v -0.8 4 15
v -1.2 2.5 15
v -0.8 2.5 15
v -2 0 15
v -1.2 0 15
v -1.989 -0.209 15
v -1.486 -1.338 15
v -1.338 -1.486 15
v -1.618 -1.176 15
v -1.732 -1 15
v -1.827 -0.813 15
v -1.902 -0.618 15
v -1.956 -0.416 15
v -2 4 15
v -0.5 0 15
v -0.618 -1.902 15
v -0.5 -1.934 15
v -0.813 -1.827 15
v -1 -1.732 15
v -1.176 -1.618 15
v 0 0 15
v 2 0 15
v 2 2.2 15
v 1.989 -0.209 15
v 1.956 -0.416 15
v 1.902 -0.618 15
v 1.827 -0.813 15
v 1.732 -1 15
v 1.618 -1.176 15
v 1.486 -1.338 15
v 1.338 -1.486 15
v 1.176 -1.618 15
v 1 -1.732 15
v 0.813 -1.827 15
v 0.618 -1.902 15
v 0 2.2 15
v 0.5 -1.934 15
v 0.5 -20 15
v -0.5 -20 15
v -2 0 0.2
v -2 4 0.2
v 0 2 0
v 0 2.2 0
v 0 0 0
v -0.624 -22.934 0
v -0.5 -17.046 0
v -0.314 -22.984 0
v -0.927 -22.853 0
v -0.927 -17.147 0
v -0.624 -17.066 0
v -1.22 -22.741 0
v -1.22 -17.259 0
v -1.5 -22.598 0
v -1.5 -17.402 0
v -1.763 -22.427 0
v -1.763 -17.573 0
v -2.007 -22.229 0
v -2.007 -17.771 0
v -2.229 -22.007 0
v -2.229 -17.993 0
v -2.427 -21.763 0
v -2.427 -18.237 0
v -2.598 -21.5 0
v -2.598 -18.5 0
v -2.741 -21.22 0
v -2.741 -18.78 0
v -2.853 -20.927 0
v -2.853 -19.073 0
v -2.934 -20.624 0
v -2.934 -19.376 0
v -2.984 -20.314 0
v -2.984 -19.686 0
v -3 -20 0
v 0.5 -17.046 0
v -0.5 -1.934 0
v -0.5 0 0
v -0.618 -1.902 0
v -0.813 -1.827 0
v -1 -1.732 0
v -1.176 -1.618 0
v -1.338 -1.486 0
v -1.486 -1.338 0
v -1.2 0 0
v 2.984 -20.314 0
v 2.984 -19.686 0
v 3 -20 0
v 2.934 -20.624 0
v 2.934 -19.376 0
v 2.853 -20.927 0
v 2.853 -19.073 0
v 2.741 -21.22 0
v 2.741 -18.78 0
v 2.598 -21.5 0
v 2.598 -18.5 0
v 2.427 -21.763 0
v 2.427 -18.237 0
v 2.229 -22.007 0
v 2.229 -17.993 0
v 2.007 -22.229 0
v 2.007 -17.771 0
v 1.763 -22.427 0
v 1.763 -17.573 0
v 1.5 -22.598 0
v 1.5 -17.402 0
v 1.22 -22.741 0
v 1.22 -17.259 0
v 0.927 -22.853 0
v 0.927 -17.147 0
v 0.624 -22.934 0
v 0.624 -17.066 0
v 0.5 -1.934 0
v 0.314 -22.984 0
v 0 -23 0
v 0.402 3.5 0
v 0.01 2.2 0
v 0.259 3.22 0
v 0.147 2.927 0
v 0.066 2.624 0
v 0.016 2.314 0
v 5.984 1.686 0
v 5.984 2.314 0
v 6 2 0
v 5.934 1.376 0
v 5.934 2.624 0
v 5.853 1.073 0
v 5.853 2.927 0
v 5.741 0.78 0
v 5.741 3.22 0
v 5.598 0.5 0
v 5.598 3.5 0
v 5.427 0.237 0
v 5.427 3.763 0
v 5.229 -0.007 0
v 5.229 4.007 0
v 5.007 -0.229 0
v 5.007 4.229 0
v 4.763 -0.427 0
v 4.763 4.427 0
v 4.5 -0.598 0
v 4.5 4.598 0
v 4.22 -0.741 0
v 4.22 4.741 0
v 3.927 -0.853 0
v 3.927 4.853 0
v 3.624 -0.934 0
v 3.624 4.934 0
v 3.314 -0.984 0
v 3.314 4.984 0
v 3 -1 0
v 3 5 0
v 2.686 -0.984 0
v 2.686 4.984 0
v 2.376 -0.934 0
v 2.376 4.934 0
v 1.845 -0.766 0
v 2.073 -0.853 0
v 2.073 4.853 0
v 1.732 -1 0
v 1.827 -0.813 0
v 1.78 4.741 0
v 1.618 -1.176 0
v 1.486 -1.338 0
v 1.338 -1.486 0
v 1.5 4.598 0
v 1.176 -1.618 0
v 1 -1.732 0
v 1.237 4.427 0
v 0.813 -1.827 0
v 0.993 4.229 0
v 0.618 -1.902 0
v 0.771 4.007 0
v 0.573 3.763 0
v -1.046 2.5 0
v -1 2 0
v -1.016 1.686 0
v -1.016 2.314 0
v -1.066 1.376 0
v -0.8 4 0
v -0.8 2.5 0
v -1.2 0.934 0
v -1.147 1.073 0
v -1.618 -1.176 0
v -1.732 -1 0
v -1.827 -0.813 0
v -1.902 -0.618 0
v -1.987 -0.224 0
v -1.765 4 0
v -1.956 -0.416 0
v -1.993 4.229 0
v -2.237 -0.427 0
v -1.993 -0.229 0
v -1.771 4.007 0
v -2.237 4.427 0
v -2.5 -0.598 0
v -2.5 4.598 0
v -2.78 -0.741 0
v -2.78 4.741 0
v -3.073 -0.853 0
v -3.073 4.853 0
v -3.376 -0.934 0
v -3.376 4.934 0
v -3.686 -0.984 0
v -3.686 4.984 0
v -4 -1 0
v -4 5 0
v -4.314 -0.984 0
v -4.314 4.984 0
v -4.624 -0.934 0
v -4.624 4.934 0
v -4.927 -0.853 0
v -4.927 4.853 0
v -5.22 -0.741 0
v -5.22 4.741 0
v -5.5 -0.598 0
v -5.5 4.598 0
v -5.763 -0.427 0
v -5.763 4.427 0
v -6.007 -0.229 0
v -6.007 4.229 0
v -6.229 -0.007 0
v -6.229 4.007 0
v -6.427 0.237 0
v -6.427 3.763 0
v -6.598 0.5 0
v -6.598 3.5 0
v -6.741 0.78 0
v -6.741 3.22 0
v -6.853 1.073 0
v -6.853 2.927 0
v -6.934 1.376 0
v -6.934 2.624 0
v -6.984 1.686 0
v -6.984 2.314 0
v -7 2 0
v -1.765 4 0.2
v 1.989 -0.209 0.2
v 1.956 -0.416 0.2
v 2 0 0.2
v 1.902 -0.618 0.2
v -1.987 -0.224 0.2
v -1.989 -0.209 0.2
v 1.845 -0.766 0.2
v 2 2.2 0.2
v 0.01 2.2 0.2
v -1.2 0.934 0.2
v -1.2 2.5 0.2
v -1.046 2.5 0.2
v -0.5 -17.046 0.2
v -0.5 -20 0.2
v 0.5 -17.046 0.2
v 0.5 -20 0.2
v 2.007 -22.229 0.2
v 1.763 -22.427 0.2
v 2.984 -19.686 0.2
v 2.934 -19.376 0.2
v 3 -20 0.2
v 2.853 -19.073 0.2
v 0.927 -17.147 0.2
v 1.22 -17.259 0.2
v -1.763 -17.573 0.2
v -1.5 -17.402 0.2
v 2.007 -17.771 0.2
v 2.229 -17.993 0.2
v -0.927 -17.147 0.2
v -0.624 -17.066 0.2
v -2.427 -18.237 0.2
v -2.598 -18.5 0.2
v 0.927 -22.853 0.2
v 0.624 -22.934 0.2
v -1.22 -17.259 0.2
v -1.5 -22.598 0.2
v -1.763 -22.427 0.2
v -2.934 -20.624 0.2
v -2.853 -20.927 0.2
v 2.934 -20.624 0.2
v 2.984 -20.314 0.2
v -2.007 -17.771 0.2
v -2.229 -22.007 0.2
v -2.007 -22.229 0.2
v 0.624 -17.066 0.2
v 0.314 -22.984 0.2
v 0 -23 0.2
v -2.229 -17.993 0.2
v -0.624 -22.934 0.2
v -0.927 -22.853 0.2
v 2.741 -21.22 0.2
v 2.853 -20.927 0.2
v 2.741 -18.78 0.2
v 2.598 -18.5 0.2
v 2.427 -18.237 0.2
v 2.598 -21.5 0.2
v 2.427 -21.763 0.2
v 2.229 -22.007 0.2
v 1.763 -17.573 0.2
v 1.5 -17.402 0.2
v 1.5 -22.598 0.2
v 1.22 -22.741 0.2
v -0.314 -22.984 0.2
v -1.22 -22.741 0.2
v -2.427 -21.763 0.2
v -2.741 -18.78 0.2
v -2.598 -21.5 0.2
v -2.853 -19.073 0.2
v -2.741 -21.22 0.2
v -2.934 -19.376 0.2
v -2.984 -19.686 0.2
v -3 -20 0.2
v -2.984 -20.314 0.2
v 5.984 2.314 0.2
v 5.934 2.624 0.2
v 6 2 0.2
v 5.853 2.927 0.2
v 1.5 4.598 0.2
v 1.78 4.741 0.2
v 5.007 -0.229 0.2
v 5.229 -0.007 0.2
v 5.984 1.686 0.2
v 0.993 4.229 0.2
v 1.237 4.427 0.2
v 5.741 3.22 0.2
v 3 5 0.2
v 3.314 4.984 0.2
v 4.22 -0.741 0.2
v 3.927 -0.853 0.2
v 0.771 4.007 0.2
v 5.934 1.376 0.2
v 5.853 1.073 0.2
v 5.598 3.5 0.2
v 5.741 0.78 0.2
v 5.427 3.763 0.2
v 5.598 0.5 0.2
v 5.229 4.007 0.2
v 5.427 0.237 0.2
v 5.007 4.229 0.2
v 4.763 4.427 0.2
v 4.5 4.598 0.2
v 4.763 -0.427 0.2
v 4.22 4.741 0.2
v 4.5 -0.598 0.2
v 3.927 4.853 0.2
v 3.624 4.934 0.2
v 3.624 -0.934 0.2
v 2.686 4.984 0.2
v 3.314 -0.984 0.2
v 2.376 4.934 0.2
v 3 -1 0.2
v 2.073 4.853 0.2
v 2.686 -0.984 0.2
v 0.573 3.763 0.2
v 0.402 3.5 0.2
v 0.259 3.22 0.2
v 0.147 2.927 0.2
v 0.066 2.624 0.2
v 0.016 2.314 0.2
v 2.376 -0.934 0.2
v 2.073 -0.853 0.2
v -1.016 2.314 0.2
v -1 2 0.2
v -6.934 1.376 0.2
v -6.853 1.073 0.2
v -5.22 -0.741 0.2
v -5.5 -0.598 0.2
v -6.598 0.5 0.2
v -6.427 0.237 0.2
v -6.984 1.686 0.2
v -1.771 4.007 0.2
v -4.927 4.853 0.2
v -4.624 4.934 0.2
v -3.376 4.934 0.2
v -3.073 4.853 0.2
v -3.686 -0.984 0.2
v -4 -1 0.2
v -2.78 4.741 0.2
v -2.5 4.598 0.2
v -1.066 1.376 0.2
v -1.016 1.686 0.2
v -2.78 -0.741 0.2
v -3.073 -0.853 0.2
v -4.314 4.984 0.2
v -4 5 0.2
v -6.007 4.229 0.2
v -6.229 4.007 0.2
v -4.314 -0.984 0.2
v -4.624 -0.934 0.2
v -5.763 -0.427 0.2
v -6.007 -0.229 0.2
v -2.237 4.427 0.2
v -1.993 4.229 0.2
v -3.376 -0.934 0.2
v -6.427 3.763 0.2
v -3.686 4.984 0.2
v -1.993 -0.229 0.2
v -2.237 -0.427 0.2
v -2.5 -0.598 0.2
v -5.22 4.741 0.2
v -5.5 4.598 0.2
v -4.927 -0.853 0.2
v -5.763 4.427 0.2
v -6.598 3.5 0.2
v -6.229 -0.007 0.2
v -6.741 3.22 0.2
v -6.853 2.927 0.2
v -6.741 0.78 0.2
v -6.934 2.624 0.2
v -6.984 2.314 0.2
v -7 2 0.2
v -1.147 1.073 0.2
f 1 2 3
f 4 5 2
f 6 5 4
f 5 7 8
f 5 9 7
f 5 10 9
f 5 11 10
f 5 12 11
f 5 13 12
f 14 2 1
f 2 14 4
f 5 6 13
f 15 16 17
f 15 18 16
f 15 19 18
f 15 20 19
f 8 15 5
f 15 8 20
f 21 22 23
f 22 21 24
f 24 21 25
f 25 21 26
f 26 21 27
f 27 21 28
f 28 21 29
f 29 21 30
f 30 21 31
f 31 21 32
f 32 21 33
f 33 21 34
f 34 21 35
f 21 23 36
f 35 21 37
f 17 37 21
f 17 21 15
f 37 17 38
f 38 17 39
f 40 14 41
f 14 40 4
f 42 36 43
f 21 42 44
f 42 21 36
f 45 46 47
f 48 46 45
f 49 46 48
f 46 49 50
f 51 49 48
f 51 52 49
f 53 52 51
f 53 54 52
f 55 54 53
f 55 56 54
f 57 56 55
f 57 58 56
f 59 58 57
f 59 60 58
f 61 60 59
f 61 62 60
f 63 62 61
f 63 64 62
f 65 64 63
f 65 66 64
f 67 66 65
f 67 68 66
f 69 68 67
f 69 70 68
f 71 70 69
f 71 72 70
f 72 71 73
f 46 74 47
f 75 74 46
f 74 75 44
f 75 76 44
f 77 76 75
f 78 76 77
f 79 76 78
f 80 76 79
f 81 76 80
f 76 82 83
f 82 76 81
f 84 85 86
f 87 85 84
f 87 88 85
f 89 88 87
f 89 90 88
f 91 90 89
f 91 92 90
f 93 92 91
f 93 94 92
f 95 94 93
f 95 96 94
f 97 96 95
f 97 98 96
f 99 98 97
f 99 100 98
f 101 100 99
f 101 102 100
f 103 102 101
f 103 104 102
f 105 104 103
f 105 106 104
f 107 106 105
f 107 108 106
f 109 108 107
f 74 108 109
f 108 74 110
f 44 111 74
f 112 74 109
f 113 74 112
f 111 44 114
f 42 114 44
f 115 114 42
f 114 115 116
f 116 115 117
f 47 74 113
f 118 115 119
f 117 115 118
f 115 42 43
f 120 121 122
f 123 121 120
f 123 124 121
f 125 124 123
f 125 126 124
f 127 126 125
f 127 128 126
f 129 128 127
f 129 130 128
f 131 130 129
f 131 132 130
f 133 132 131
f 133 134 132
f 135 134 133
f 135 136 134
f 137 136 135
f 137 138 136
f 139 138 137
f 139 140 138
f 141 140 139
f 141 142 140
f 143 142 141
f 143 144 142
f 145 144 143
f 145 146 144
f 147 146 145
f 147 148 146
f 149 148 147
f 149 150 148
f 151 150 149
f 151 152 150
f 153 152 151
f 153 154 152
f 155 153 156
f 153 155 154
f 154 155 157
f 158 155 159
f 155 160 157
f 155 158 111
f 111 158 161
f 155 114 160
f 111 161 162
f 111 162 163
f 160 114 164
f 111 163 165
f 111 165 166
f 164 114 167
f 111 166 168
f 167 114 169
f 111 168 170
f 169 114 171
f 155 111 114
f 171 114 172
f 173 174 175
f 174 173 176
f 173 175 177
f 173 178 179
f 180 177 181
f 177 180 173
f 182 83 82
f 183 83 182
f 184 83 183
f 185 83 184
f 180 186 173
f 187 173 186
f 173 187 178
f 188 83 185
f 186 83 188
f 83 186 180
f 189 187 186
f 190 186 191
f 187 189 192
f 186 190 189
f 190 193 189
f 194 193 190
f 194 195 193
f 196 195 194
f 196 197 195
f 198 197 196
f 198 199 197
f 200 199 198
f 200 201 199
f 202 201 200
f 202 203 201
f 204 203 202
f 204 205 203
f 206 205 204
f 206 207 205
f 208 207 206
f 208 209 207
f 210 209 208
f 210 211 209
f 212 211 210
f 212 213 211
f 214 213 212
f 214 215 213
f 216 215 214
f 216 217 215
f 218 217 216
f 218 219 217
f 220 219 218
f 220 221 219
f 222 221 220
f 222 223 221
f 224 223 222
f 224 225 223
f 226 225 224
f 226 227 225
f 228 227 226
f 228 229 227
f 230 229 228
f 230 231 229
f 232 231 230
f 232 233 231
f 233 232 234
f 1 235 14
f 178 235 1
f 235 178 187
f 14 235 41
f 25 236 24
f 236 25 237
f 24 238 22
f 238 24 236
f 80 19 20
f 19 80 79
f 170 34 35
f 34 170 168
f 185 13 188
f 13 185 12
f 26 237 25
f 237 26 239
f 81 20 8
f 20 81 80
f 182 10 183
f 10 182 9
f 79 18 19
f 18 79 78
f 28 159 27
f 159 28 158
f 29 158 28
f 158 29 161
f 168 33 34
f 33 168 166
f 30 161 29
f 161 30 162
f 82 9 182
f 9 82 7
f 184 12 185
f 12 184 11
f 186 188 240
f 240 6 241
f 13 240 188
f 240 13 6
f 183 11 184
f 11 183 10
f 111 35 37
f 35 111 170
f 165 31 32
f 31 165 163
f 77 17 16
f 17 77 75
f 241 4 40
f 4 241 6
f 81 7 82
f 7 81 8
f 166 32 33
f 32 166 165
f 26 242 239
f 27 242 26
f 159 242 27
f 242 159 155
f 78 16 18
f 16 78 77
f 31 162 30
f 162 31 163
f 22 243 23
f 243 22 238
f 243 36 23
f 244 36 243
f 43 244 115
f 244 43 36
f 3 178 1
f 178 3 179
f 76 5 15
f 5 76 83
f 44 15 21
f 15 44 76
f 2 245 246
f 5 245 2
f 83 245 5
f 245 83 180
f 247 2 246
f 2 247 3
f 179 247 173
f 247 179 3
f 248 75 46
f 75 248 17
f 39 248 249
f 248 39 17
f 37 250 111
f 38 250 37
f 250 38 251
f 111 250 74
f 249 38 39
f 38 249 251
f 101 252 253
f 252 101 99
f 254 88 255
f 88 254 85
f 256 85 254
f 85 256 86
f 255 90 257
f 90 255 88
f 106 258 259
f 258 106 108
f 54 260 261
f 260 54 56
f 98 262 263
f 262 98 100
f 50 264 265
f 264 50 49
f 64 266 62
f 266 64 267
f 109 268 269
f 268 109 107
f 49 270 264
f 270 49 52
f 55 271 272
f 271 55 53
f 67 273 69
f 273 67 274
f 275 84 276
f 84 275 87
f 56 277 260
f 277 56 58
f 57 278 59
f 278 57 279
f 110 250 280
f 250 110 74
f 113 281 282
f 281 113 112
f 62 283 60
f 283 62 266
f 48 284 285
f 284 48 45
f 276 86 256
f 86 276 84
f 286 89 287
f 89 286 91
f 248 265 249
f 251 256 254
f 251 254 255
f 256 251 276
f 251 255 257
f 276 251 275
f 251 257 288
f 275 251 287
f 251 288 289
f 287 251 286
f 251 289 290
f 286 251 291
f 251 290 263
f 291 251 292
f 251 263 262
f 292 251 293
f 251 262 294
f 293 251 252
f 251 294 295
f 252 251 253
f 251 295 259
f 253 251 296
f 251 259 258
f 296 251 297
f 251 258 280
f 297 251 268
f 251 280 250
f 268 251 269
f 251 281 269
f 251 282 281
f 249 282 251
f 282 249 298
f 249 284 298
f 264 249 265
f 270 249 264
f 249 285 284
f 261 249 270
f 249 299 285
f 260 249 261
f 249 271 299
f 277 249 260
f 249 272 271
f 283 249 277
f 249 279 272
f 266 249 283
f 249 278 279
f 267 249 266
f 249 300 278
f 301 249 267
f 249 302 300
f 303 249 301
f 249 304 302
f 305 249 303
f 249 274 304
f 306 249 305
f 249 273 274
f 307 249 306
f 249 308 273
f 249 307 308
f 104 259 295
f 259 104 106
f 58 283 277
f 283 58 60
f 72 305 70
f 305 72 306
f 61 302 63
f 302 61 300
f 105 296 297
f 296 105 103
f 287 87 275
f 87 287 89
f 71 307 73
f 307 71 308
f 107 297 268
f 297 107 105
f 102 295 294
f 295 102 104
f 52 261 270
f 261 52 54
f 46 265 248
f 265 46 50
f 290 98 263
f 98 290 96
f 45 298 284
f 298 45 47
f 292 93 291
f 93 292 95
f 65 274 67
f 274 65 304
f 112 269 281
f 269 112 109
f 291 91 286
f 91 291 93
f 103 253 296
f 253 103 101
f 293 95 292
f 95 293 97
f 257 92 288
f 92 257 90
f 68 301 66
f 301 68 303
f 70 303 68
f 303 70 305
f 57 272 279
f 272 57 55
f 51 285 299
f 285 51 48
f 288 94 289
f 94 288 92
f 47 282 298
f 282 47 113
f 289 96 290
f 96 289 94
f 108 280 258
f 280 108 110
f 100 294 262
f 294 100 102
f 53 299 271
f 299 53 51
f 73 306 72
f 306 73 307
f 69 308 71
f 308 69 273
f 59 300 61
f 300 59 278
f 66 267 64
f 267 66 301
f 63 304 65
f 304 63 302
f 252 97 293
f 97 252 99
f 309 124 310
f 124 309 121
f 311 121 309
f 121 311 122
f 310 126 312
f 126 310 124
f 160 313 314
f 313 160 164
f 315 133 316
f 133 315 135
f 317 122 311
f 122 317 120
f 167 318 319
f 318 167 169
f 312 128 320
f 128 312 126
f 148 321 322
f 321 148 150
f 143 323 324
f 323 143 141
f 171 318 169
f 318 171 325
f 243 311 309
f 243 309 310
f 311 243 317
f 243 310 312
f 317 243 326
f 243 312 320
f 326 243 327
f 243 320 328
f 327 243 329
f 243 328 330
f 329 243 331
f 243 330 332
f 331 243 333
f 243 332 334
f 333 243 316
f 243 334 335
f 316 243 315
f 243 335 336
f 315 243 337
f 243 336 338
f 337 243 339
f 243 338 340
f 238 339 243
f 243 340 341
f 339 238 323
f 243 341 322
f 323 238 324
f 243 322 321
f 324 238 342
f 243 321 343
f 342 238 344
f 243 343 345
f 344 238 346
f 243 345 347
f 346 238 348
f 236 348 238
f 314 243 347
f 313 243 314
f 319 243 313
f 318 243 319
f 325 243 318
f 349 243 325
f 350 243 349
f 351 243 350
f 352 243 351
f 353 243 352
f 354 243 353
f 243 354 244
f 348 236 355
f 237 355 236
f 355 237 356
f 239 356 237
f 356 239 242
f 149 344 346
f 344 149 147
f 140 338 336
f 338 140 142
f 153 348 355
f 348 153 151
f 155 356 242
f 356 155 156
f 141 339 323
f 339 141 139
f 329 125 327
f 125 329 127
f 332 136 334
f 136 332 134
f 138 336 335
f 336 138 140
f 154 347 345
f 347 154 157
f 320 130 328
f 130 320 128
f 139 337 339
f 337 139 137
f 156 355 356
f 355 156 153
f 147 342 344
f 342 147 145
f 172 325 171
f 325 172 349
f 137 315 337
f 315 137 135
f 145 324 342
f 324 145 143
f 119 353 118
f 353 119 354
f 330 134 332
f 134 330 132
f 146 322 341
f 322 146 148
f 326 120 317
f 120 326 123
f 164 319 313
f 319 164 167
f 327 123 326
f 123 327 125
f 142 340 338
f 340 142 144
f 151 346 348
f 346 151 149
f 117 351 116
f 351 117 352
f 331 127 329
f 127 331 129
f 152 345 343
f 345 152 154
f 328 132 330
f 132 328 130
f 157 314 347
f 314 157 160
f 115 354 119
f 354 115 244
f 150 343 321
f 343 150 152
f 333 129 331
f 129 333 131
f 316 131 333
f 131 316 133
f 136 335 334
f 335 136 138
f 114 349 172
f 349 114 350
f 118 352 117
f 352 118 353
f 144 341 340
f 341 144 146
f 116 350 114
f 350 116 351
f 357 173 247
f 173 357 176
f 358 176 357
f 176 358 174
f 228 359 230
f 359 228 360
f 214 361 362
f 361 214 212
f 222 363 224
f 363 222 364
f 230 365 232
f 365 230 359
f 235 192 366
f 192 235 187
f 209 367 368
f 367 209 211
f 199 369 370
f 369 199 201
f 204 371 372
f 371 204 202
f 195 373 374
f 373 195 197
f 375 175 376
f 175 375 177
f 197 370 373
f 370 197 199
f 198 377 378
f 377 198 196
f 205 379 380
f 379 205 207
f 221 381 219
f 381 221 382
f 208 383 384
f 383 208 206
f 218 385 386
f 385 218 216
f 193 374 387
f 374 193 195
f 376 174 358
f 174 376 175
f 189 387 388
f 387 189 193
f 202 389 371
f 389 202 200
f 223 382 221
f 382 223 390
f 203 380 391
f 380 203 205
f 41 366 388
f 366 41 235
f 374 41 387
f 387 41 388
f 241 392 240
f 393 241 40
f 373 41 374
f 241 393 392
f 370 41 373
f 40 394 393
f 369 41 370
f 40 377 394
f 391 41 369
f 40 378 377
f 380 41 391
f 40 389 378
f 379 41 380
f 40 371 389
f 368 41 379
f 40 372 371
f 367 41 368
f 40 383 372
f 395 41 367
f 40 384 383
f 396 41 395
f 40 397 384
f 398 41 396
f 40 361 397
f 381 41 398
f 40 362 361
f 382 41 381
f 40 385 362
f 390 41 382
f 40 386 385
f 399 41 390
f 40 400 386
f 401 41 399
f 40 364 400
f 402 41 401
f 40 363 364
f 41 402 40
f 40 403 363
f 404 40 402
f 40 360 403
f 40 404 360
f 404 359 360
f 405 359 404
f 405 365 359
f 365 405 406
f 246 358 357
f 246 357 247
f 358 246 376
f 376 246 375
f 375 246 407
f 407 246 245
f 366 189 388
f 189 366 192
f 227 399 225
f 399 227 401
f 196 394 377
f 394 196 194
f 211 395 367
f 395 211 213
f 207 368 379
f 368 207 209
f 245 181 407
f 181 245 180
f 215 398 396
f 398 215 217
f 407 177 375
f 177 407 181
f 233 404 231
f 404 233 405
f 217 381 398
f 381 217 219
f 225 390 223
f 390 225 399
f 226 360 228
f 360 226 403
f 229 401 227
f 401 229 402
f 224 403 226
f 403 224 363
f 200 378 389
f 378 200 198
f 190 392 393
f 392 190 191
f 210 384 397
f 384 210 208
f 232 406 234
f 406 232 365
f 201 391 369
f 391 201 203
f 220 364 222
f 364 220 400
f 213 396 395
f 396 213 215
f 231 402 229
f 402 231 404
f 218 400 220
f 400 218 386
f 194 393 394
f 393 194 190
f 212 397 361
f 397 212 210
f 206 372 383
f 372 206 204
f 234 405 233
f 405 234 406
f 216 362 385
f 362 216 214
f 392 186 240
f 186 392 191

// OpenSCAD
// Grabber for SD cards on a Pi.
$fn=60;
e=0.01;

module sdcard_back(wide=20) {
  cube([wide, 20, 0.8]);
  color("red") cube([wide, 2.5, 1.2]);
}

thick=4;
width=15;

module grabber() {
  translate([0, -20, -1/2]) cube([width, 20, 1]);  // handle
  difference() {
     union() {
      translate([0, 0, 0]) cube([width, 4, thick/2]);
      rotate([0, 90, 0]) cylinder(r=thick/2, h=width);
      translate([0, 0, -thick/2]) cube([width, 2.2, thick/2]);
      rotate([0, 90, 0]) cylinder(r=thick/2, h=width);
    }

    #sdcard_back();
  }
}

module ear() {
  color("green") cylinder(r=3, h=0.20);
}

rotate([0, -90, 0]) grabber();
translate([0, -20, 0]) ear();
translate([3, 2, 0]) ear();
translate([-4, 2, 0]) ear();
